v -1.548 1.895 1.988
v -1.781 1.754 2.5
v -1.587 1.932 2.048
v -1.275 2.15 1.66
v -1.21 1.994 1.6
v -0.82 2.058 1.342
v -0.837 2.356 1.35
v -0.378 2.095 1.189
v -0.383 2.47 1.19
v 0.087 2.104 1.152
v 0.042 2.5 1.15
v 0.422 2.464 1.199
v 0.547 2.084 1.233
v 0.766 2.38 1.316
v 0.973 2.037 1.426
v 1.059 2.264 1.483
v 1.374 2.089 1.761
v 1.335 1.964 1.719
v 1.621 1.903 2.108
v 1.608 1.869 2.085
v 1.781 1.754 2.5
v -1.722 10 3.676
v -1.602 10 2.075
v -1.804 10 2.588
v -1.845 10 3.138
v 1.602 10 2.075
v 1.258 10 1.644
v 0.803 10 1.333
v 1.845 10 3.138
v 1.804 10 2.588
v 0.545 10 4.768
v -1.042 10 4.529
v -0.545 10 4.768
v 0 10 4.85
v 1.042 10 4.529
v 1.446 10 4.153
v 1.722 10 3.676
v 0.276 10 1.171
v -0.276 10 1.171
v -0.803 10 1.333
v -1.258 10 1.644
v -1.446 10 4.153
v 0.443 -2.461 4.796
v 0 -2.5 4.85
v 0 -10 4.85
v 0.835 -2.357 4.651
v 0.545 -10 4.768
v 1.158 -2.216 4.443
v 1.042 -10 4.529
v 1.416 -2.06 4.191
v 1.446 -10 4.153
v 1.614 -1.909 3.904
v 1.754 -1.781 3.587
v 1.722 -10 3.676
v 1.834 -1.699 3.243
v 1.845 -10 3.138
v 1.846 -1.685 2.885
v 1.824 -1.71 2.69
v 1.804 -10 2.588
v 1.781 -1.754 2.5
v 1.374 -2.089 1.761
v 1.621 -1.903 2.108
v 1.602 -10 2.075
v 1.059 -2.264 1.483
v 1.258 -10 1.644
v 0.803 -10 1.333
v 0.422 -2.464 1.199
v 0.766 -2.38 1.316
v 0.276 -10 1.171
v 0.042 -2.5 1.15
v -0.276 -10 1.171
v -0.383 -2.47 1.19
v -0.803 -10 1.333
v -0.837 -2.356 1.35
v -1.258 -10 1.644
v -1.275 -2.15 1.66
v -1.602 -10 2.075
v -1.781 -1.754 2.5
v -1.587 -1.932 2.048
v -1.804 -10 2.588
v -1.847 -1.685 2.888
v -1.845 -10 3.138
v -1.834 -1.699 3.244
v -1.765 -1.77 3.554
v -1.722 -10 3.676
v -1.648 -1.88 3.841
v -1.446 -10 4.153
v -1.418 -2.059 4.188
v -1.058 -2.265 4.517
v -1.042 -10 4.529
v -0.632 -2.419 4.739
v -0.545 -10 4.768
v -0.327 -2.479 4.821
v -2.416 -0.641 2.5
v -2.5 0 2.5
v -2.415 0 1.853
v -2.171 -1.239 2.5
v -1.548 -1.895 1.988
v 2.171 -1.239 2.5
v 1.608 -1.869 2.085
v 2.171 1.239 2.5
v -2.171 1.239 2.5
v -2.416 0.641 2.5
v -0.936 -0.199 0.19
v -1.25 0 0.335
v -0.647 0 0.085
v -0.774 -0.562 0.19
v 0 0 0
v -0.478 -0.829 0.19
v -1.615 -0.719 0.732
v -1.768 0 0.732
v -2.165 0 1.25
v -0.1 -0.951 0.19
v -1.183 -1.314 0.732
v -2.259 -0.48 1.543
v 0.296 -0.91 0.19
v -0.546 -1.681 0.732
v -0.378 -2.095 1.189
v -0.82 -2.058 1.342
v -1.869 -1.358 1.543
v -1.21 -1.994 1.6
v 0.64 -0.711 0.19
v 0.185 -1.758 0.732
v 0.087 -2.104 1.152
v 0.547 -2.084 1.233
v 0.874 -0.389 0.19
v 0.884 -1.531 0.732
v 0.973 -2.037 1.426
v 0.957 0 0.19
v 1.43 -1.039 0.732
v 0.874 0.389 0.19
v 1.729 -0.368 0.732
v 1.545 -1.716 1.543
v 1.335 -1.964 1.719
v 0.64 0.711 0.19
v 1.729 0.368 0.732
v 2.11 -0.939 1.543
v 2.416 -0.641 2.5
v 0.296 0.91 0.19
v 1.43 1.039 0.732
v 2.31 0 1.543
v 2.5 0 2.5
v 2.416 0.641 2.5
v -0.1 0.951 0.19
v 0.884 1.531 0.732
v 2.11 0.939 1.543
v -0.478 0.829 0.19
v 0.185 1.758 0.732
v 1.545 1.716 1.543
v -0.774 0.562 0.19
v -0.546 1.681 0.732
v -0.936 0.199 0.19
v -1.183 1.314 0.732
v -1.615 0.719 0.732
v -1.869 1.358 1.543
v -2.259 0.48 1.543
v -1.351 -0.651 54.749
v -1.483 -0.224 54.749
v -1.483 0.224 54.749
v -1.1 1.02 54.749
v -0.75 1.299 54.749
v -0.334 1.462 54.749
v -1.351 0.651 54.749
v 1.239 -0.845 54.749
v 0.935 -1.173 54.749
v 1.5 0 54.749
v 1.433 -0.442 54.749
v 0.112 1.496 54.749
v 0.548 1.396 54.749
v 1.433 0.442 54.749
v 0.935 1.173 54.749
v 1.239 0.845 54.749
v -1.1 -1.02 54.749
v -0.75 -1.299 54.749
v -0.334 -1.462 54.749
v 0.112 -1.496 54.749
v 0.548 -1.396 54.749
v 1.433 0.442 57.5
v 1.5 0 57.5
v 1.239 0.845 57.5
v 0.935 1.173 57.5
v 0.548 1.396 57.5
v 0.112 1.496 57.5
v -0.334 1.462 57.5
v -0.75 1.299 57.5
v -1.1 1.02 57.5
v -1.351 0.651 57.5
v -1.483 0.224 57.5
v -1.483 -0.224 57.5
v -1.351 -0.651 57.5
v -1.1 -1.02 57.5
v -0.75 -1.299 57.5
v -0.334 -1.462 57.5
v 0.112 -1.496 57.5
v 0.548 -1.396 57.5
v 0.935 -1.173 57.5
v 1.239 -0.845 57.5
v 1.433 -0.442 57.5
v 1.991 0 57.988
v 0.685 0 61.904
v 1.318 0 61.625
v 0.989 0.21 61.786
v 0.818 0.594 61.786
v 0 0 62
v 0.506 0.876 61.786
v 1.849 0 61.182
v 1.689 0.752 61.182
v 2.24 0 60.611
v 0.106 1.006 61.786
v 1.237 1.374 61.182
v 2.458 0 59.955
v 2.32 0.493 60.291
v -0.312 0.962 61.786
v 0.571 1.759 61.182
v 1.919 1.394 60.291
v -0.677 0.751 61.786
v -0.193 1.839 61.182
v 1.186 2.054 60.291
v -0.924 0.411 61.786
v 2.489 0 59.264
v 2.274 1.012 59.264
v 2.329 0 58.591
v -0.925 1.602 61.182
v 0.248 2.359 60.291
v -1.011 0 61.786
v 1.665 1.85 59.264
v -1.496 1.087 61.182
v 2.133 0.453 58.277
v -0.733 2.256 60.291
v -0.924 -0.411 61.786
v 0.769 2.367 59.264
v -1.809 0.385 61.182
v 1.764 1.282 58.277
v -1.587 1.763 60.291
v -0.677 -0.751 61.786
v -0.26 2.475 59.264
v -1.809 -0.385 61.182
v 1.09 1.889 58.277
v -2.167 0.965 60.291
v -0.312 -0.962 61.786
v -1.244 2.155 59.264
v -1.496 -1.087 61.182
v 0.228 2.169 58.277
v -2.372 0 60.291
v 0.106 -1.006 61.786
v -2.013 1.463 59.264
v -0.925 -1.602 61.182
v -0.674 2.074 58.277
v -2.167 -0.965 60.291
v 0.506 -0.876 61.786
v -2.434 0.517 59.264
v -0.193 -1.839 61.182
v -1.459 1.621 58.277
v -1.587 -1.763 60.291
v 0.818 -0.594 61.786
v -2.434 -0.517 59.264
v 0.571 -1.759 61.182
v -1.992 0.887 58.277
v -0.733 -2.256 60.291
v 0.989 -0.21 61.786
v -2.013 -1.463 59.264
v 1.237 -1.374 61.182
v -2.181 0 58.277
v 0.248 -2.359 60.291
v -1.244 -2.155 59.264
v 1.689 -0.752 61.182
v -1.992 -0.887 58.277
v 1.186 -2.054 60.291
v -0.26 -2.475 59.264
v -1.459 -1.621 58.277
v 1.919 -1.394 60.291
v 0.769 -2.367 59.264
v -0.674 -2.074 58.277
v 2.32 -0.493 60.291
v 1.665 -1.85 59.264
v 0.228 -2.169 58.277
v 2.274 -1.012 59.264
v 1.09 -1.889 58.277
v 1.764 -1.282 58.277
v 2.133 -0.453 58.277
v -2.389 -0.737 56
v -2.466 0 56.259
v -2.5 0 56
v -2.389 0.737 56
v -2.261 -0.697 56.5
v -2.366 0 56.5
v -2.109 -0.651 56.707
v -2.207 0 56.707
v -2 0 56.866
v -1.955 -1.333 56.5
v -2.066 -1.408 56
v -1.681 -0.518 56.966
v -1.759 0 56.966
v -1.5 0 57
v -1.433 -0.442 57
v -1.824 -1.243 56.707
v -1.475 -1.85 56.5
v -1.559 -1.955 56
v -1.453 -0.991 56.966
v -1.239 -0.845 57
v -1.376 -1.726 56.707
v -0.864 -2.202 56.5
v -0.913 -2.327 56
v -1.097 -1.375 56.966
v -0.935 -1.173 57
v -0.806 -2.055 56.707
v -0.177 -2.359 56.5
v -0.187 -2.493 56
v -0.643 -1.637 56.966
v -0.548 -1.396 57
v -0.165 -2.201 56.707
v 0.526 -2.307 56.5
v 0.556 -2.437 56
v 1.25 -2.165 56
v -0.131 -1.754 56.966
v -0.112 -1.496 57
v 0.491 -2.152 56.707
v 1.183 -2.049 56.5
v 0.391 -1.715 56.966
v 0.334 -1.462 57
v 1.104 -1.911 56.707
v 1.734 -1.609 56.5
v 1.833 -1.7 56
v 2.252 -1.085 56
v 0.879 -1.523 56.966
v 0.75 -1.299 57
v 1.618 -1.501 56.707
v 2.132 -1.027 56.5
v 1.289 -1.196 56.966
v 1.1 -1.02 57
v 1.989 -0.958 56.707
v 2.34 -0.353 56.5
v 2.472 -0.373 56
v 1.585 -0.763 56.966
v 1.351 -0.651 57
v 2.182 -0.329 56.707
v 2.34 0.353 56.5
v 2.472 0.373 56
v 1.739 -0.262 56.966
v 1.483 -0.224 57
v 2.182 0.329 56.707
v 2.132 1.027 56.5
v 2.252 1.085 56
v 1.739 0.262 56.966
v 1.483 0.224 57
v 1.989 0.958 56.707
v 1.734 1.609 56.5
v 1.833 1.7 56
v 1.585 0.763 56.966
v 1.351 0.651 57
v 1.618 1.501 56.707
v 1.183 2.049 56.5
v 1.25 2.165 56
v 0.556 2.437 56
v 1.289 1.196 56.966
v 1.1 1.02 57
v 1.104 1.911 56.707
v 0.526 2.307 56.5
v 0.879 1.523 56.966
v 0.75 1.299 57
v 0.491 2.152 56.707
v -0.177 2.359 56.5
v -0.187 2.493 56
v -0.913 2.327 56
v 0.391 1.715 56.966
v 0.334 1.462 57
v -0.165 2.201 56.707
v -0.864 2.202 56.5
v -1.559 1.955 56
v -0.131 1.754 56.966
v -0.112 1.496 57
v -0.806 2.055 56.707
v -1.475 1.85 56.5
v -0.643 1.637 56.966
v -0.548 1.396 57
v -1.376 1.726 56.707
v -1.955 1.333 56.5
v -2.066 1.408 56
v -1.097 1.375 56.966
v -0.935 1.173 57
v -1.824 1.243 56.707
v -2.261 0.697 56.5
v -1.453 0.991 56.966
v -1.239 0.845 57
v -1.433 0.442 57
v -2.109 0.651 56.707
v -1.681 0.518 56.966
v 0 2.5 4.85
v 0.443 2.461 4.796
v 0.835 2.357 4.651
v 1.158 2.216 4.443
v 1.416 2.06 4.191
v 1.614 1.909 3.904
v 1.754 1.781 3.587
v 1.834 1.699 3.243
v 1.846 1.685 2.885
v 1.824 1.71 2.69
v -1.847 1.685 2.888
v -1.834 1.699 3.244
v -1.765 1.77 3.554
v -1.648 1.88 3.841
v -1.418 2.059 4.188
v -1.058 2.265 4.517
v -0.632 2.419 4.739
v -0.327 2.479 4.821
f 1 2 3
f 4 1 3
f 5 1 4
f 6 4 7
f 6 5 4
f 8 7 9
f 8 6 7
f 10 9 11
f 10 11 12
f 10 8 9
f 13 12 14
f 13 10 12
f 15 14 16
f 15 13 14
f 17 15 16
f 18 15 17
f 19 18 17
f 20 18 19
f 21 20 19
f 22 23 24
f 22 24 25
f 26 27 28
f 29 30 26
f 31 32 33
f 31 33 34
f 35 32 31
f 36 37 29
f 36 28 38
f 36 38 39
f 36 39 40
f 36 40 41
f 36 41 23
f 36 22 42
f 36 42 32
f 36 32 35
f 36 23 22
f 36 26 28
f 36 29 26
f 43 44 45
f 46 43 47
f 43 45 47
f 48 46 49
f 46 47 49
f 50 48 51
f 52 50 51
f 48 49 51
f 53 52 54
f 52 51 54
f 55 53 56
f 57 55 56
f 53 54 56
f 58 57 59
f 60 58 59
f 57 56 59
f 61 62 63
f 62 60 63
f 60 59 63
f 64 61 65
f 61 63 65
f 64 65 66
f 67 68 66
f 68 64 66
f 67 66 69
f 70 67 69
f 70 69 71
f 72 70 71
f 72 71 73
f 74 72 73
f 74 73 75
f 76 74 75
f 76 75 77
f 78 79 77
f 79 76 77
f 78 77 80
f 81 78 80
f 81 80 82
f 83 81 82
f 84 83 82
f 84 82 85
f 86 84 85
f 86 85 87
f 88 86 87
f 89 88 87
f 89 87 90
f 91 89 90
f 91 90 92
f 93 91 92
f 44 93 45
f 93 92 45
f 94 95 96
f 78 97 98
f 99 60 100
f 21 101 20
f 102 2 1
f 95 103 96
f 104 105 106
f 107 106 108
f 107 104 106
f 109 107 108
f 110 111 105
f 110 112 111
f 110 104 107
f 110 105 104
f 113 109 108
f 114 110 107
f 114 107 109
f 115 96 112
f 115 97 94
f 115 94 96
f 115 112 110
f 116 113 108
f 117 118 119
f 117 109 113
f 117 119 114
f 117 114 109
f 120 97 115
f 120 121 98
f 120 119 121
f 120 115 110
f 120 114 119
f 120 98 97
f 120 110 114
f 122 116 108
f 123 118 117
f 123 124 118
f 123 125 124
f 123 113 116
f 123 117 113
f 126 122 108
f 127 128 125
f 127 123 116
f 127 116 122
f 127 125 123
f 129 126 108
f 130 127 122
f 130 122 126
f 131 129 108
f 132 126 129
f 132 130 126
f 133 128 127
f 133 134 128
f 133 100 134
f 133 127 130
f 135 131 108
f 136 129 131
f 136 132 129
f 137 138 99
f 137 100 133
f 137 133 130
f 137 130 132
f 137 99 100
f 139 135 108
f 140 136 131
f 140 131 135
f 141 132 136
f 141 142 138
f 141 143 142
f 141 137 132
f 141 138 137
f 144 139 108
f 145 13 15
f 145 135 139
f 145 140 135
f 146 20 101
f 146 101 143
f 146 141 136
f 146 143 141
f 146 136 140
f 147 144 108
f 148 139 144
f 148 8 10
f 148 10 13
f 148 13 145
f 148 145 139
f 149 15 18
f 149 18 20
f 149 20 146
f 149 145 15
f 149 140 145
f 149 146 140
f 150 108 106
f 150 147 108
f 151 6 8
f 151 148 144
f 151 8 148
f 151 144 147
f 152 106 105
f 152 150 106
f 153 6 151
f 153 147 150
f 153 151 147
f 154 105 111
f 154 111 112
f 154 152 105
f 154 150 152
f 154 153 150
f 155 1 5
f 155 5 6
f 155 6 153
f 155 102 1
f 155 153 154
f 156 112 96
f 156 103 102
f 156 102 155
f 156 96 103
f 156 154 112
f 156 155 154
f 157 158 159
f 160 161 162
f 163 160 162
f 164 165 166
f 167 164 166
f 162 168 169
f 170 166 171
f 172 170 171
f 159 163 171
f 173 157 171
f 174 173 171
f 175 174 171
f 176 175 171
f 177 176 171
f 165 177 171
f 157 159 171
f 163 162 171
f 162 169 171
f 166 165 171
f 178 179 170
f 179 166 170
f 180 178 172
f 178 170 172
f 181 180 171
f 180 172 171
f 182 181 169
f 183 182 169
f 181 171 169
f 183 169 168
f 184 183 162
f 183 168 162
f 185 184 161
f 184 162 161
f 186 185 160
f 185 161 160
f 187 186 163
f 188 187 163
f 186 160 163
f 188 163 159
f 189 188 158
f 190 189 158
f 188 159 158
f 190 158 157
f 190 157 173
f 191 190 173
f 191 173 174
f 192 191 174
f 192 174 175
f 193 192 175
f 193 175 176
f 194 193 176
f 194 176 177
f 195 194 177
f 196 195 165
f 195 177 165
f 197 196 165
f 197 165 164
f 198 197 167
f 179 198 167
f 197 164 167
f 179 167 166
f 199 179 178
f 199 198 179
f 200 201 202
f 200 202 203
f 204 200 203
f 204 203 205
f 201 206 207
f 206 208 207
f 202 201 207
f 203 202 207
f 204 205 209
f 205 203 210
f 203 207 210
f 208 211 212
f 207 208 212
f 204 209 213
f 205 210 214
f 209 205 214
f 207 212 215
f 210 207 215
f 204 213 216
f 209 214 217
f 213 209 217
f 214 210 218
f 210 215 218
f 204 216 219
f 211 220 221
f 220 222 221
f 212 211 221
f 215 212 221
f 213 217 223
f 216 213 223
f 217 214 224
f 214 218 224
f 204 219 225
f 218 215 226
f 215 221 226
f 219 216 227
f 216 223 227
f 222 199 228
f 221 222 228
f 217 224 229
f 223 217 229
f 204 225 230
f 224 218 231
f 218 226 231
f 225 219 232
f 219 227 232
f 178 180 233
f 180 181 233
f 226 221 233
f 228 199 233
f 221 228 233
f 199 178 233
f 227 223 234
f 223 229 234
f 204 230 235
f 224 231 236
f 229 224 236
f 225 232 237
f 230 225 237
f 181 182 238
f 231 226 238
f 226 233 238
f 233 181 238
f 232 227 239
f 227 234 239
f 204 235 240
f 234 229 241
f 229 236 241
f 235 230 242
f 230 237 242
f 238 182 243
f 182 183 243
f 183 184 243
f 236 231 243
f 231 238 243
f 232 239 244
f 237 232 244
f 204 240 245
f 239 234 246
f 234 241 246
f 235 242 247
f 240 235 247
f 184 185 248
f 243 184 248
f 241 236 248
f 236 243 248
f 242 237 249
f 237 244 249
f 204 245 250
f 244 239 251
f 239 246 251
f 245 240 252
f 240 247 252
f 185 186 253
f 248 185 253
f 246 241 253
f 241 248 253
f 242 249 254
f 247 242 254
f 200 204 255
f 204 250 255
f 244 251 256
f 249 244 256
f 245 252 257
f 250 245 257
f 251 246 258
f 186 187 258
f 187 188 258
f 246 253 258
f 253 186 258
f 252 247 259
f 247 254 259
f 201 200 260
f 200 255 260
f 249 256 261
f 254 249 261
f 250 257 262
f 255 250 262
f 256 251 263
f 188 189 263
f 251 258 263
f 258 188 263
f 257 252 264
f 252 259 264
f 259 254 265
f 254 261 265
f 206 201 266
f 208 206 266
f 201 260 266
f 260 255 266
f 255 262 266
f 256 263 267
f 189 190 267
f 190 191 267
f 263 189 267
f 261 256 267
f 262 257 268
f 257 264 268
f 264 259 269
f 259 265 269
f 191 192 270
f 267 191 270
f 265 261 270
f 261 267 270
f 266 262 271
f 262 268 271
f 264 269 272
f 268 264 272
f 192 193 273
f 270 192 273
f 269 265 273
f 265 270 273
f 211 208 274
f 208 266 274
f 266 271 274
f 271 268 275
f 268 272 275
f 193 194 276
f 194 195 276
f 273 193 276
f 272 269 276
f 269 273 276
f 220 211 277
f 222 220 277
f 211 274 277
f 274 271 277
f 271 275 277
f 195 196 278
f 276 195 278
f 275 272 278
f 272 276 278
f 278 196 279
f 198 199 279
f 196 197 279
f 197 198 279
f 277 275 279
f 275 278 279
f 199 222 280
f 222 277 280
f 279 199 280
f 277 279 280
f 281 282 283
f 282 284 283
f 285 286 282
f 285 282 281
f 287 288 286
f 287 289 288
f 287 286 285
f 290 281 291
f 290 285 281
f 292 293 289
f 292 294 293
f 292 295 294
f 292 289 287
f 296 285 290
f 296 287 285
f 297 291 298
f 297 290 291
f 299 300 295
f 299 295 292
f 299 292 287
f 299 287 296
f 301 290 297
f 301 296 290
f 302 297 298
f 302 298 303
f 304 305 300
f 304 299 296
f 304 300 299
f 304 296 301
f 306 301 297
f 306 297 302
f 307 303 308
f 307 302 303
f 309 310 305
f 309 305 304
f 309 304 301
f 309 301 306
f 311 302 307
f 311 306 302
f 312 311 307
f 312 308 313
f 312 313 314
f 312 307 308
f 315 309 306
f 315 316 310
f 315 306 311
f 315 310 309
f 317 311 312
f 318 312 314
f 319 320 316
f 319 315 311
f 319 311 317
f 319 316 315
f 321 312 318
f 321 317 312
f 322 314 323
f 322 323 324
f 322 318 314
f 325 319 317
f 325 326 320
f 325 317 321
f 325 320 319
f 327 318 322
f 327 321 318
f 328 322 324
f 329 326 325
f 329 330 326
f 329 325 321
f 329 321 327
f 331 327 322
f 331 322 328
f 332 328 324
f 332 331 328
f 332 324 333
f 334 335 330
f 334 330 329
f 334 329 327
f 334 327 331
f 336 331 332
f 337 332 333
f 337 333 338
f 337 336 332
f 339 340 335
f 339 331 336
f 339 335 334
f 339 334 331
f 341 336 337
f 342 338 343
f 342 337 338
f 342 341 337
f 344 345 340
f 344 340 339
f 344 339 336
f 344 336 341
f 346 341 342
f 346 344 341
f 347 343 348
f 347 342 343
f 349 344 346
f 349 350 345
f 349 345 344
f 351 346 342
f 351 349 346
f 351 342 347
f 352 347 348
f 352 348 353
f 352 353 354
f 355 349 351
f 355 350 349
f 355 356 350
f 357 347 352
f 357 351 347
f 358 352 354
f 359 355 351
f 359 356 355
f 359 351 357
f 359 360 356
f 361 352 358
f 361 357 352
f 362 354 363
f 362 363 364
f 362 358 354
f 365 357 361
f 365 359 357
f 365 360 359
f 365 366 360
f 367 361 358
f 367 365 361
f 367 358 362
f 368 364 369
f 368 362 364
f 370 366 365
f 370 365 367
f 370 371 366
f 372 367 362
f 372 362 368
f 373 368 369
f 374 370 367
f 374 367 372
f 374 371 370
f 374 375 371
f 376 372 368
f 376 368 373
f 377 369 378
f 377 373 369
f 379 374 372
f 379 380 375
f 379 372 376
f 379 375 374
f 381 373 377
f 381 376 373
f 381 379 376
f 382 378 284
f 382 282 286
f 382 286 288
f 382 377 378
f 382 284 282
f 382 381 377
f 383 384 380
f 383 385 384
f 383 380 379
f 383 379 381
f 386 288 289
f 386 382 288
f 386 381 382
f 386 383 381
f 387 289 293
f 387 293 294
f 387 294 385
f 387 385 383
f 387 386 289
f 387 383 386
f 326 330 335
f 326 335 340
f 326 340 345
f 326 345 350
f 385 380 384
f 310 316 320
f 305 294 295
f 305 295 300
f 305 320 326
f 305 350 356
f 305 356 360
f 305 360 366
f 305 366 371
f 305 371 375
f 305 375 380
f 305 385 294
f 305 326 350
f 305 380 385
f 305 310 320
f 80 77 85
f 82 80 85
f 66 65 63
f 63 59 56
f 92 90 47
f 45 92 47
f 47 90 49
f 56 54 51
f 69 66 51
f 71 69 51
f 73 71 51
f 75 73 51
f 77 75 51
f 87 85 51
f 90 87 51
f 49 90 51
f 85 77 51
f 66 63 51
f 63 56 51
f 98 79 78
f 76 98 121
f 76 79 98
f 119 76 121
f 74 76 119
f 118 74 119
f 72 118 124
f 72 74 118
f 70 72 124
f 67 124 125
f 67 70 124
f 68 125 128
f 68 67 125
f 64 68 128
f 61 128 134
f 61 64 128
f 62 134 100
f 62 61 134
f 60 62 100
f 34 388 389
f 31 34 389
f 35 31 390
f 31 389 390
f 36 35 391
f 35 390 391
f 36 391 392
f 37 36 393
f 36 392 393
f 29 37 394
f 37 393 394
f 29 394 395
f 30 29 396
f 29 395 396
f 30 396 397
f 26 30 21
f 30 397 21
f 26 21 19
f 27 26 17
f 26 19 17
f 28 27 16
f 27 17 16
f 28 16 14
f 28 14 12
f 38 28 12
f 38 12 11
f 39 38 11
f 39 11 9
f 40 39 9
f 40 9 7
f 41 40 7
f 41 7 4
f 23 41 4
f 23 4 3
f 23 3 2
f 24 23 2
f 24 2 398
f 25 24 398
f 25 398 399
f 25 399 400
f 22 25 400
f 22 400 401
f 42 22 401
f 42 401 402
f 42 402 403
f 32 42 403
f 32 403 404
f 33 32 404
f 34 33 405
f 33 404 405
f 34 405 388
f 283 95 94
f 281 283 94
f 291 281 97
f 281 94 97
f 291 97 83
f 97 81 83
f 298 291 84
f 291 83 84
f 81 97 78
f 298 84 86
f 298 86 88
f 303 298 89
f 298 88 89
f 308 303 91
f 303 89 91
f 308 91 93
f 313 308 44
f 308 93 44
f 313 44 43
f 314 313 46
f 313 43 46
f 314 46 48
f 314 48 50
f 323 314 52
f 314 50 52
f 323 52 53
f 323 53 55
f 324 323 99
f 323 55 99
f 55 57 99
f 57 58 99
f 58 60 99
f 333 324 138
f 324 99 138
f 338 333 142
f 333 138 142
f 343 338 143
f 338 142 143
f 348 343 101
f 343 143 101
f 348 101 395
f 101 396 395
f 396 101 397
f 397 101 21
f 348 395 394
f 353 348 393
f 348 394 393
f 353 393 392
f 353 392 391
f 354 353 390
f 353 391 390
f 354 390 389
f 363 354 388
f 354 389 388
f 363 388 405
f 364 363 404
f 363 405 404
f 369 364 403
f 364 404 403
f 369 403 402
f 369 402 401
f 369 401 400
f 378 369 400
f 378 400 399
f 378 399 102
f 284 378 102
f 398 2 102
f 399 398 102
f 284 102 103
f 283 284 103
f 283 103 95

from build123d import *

# Parameters (mm, degrees)
SKETCH1_R                = 2.5
BOSS_EXTRUDE1_DEPTH      = 57
SKETCH3_W                = 1.5
SKETCH3_H                = 3.627330444
FILLET1_R                = 1
BOSS_EXTRUDE2_DEPTH      = 10
BOSS_EXTRUDE2_DEPTH_BACK = 10
SKETCH4_R                = 1.85
FILLET2_R                = 2.5


with BuildPart() as part:
    # Sketch1 → Boss-Extrude1 (new body)
    with BuildSketch(Plane.XY):
        with Locations(Location((0, 0, 0), (0, 0, 180))):
            Circle(SKETCH1_R)
    extrude(amount=BOSS_EXTRUDE1_DEPTH)

    # Fillet1
    fillet1_edges = [part.edges().sort_by_distance(p)[0] for p in [
        (2.5, 0, 57),
    ]]
    fillet(fillet1_edges, radius=FILLET1_R)

    # Sketch4 → Boss-Extrude2 (add, two sides: drawn at the far end of the back side and taken through both)
    with BuildSketch(Plane(origin=(0, 0, 0), x_dir=(1, 0, 0), z_dir=(0, 1, 0)).offset(-BOSS_EXTRUDE2_DEPTH_BACK)):
        with Locations(Location((0, -3, 0), (0, 0, 270))):
            Circle(SKETCH4_R)
    extrude(amount=BOSS_EXTRUDE2_DEPTH + BOSS_EXTRUDE2_DEPTH_BACK)

    # Fillet2
    # the kernel refuses this fillet: 2.5 mm, written as the material it takes off along each edge
    with BuildSketch(Plane(origin=(0, 0, 0), x_dir=(-1, 0, 0), z_dir=(0, 1, 0))) as fillet2_piece_1_section:
        with BuildLine():
            CenterArc((2.5 - FILLET2_R, FILLET2_R), FILLET2_R, 270, 90)
            Line((2.5 - FILLET2_R, 0), (2.5, 0))
            Line((2.5, 0), (2.5, FILLET2_R))
        make_face()
    fillet2_piece_1 = revolve(axis=Axis((0, 0, 0), (0, 0, 1)), mode=Mode.PRIVATE)
    fillet2_piece_1 = fillet2_piece_1 - Plane(origin=(0, 0, 3), x_dir=(0, 0, 1), z_dir=(0, -1, 0)) * Cylinder(1.85, 10, mode=Mode.PRIVATE)
    add(fillet2_piece_1, mode=Mode.SUBTRACT)


with BuildPart() as body_2:
    # Sketch3 → Revolve1 (revolve)
    with BuildSketch(Plane(origin=(0, 0, 0), x_dir=(1, 0, 0), z_dir=(0, 1, 0)), mode=Mode.PRIVATE) as revolve1_sk:
        with BuildLine():
            Line((0, -57), (0, -62))
            ThreePointArc((0, -62), (-2.5, -59.5), (0, -57))
        make_face()
        with Locations((-0.75, -56.562735647)):
            Rectangle(SKETCH3_W, SKETCH3_H)
    revolve(revolve1_sk.sketch.rotate(Axis((0, 0, 57), (0, 0, 1)), 180), axis=Axis((0, 0, 57), (0, 0, 1)))


solid = Compound([part.part, body_2.part])
